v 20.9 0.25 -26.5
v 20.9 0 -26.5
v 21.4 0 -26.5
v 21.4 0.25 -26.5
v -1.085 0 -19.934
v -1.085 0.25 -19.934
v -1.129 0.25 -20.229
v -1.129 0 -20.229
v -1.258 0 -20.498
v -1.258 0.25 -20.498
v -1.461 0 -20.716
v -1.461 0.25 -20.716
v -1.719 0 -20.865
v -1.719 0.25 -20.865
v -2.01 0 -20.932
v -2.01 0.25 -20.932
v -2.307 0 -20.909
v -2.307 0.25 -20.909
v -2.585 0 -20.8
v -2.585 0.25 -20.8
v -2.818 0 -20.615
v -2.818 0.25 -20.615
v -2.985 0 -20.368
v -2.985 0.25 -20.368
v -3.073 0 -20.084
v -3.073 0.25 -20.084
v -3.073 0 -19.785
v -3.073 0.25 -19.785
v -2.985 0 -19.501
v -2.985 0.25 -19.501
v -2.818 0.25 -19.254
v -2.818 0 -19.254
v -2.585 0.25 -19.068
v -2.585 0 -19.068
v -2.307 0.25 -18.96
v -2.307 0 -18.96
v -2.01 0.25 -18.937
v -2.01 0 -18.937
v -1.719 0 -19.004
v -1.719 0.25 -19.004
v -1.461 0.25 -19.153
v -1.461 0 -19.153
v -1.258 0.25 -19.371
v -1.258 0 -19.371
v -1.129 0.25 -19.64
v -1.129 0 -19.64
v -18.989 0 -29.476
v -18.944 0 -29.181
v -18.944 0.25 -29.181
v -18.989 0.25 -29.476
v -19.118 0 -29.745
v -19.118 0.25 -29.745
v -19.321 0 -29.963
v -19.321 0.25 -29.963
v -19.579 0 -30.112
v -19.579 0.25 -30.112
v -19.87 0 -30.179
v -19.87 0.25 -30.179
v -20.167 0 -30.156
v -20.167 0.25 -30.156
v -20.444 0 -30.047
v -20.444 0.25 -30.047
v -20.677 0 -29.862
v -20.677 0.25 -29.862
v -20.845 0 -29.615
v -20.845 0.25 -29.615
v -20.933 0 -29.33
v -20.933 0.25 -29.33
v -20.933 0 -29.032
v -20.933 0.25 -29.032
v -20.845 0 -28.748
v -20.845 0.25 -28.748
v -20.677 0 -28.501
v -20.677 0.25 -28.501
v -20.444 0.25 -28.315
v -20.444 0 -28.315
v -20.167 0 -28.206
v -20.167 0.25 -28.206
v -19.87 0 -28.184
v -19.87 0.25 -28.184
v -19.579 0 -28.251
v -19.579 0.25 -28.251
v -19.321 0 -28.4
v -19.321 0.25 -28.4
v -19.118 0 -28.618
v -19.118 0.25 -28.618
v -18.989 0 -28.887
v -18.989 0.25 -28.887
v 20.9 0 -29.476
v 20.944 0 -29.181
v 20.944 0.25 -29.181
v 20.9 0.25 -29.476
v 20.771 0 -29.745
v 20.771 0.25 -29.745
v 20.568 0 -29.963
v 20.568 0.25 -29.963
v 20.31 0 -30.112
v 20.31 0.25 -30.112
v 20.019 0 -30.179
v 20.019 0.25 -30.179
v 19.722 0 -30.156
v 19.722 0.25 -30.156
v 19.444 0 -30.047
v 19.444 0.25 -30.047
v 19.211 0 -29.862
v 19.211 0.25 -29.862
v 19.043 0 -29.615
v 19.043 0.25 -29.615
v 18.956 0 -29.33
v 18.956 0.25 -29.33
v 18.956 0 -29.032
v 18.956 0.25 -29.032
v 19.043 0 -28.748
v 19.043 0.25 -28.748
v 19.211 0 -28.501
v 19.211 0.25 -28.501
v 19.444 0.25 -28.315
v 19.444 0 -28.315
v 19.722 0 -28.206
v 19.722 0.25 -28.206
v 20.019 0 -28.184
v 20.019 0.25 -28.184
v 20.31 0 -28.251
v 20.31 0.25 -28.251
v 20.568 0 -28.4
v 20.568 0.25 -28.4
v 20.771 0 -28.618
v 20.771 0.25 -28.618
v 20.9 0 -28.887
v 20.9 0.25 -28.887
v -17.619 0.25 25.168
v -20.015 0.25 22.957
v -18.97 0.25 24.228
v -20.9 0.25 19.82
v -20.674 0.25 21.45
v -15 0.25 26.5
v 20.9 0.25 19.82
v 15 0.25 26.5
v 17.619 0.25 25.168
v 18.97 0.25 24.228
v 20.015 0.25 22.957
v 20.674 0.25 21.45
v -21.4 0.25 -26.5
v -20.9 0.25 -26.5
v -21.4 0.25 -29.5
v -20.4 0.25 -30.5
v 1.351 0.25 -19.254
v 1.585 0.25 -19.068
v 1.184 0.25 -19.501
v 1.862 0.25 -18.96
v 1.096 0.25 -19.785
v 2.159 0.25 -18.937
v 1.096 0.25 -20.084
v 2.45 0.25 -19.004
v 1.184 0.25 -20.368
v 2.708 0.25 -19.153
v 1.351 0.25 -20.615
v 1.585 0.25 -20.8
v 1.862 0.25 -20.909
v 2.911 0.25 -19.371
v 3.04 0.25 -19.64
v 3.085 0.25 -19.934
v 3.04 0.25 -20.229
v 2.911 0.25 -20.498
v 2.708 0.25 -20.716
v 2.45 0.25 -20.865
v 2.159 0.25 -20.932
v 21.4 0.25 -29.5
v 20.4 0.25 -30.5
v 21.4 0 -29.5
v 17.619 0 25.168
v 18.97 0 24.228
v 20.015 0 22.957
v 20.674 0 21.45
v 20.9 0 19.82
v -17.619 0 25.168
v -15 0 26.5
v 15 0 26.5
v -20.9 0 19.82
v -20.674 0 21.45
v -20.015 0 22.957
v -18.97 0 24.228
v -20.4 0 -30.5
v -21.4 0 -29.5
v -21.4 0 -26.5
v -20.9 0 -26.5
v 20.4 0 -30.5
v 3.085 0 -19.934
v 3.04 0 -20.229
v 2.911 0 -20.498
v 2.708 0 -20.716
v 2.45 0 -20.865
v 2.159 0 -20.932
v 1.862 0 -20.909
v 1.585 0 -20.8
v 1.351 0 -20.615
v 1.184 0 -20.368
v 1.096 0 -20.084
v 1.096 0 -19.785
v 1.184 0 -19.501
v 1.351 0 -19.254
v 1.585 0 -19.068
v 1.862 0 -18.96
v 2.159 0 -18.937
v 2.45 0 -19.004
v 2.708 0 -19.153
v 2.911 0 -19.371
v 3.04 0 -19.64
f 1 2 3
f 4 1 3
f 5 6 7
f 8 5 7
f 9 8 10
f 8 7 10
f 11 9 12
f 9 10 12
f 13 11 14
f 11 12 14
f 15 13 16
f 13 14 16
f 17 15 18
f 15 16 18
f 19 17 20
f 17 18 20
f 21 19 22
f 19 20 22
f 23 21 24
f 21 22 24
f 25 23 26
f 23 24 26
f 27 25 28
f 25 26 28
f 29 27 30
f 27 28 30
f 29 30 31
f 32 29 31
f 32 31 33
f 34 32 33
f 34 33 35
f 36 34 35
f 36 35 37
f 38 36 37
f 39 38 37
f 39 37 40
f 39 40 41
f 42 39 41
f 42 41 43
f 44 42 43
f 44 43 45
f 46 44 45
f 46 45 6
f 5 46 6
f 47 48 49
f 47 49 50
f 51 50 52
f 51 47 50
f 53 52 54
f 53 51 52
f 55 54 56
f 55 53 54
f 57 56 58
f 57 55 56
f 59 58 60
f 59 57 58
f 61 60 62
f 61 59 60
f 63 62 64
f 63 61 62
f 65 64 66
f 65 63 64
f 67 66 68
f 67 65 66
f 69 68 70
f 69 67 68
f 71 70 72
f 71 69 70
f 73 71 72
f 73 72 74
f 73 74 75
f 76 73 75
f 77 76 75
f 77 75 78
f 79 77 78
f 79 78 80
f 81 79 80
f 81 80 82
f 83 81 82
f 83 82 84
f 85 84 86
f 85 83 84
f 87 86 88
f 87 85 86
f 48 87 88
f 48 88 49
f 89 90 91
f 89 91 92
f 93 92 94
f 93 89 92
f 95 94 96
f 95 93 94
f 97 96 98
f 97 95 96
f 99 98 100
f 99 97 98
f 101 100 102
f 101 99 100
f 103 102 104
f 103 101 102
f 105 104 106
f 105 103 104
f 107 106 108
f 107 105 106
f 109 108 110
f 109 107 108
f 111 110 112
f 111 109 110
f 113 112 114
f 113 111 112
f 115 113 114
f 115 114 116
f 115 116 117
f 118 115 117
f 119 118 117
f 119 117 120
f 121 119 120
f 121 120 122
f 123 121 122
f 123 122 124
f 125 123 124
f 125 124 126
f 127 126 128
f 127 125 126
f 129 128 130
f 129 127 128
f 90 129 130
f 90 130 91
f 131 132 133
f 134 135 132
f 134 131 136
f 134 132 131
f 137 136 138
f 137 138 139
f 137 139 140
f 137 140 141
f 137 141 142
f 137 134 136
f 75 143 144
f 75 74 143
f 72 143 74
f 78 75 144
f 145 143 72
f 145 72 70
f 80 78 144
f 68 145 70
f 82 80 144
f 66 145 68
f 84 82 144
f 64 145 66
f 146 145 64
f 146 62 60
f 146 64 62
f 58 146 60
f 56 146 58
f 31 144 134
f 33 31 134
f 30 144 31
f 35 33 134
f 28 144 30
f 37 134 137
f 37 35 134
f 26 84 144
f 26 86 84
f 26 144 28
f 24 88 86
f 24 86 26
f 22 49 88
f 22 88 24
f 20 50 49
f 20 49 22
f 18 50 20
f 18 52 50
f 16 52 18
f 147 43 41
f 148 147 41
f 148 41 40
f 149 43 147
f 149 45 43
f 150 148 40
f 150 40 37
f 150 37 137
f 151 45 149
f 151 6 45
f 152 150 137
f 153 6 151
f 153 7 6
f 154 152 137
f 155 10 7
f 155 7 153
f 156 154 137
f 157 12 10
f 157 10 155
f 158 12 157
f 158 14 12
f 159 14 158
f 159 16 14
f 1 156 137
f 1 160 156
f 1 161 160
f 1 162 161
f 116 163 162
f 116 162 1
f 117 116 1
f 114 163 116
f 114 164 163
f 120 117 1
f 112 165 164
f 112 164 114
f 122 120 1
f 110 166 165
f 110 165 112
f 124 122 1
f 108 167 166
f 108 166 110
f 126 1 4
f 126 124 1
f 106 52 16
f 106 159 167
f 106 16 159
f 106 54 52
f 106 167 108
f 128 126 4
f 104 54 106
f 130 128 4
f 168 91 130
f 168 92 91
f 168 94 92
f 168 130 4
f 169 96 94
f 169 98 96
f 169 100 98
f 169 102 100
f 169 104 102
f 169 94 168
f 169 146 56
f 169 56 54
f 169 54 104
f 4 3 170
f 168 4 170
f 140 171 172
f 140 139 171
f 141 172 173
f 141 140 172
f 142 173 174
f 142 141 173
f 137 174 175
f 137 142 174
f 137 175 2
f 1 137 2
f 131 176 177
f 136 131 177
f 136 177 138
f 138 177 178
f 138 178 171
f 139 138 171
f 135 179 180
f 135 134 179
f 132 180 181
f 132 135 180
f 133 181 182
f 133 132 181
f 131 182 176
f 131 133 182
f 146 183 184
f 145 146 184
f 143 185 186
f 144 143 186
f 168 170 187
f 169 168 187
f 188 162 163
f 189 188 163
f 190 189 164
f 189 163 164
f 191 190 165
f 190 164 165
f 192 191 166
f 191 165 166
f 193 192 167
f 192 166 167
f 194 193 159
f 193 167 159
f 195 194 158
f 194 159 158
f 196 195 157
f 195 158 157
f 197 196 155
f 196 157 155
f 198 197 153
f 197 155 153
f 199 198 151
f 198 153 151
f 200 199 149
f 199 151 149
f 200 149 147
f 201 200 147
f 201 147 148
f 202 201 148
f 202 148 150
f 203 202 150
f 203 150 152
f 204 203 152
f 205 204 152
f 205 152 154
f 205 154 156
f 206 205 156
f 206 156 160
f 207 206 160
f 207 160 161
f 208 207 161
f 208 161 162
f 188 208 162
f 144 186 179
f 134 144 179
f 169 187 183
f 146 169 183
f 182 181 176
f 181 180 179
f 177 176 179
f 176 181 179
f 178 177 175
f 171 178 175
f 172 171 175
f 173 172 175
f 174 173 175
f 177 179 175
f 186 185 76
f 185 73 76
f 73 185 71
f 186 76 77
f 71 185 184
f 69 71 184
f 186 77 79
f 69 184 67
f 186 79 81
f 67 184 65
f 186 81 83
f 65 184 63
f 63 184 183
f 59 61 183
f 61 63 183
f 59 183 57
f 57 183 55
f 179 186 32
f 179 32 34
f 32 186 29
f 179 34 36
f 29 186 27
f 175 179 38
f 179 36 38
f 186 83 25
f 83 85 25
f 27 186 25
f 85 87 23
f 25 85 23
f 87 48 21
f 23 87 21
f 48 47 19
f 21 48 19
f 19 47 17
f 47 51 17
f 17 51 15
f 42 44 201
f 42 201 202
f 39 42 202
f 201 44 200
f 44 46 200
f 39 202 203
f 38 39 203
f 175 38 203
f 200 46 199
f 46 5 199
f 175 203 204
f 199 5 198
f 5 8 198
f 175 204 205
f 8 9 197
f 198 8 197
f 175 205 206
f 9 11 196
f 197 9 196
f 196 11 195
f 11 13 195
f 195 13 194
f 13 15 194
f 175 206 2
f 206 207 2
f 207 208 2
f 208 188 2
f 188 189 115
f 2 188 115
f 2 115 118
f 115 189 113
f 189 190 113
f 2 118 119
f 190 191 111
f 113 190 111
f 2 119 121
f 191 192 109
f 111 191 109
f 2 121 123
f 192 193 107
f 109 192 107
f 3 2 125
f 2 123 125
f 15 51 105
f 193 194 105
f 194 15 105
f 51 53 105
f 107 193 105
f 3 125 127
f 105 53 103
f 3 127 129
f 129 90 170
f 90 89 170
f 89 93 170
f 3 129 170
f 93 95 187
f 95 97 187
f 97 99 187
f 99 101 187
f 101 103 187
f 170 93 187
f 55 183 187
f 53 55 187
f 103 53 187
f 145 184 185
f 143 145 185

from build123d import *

# Parameters (mm, degrees)
SKETCH1_R           = 1
BOSS_EXTRUDE1_DEPTH = 0.25
SKETCH2_R           = 1
CUT_EXTRUDE1_DEPTH  = 4.5
FILLET1_R           = 6


with BuildPart() as part:
    # Sketch1 → Boss-Extrude1 (new body)
    with BuildSketch(Plane(origin=(0, 0, 0), x_dir=(1, 0, 0), z_dir=(0, 1, 0))):
        Polygon((-21.4, 26.5), (-20.9, 26.5), (-20.9, -23.5), (-15, -26.5), (15, -26.5), (20.9, -23.5), (20.9, 26.5), (21.4, 26.5), (21.4, 29.5), (20.4, 30.5), (-20.4, 30.5), (-21.4, 29.5), align=None)
        with Locations((-19.944365081, 29.181392426)):
            Circle(SKETCH1_R, mode=Mode.SUBTRACT)
        with Locations((19.944365081, 29.181392426)):
            Circle(SKETCH1_R, mode=Mode.SUBTRACT)
    extrude(amount=BOSS_EXTRUDE1_DEPTH)

    # Sketch2 → Cut-Extrude1 (cut)
    with BuildSketch(Plane(origin=(0, 0.25, 0), x_dir=(1, 0, 0), z_dir=(0, 1, 0))):
        with Locations((-2.084530189, 19.934465076)):
            Circle(SKETCH2_R)
        with Locations((2.084530189, 19.934465076)):
            Circle(SKETCH2_R)
    extrude(amount=-CUT_EXTRUDE1_DEPTH, mode=Mode.SUBTRACT)

    # Fillet1
    fillet1_edges = [part.edges().sort_by_distance(p)[0] for p in [
        (20.9, 0.125, 23.5),
        (-20.9, 0.125, 23.5),
    ]]
    fillet(fillet1_edges, radius=FILLET1_R)


solid = part.part
